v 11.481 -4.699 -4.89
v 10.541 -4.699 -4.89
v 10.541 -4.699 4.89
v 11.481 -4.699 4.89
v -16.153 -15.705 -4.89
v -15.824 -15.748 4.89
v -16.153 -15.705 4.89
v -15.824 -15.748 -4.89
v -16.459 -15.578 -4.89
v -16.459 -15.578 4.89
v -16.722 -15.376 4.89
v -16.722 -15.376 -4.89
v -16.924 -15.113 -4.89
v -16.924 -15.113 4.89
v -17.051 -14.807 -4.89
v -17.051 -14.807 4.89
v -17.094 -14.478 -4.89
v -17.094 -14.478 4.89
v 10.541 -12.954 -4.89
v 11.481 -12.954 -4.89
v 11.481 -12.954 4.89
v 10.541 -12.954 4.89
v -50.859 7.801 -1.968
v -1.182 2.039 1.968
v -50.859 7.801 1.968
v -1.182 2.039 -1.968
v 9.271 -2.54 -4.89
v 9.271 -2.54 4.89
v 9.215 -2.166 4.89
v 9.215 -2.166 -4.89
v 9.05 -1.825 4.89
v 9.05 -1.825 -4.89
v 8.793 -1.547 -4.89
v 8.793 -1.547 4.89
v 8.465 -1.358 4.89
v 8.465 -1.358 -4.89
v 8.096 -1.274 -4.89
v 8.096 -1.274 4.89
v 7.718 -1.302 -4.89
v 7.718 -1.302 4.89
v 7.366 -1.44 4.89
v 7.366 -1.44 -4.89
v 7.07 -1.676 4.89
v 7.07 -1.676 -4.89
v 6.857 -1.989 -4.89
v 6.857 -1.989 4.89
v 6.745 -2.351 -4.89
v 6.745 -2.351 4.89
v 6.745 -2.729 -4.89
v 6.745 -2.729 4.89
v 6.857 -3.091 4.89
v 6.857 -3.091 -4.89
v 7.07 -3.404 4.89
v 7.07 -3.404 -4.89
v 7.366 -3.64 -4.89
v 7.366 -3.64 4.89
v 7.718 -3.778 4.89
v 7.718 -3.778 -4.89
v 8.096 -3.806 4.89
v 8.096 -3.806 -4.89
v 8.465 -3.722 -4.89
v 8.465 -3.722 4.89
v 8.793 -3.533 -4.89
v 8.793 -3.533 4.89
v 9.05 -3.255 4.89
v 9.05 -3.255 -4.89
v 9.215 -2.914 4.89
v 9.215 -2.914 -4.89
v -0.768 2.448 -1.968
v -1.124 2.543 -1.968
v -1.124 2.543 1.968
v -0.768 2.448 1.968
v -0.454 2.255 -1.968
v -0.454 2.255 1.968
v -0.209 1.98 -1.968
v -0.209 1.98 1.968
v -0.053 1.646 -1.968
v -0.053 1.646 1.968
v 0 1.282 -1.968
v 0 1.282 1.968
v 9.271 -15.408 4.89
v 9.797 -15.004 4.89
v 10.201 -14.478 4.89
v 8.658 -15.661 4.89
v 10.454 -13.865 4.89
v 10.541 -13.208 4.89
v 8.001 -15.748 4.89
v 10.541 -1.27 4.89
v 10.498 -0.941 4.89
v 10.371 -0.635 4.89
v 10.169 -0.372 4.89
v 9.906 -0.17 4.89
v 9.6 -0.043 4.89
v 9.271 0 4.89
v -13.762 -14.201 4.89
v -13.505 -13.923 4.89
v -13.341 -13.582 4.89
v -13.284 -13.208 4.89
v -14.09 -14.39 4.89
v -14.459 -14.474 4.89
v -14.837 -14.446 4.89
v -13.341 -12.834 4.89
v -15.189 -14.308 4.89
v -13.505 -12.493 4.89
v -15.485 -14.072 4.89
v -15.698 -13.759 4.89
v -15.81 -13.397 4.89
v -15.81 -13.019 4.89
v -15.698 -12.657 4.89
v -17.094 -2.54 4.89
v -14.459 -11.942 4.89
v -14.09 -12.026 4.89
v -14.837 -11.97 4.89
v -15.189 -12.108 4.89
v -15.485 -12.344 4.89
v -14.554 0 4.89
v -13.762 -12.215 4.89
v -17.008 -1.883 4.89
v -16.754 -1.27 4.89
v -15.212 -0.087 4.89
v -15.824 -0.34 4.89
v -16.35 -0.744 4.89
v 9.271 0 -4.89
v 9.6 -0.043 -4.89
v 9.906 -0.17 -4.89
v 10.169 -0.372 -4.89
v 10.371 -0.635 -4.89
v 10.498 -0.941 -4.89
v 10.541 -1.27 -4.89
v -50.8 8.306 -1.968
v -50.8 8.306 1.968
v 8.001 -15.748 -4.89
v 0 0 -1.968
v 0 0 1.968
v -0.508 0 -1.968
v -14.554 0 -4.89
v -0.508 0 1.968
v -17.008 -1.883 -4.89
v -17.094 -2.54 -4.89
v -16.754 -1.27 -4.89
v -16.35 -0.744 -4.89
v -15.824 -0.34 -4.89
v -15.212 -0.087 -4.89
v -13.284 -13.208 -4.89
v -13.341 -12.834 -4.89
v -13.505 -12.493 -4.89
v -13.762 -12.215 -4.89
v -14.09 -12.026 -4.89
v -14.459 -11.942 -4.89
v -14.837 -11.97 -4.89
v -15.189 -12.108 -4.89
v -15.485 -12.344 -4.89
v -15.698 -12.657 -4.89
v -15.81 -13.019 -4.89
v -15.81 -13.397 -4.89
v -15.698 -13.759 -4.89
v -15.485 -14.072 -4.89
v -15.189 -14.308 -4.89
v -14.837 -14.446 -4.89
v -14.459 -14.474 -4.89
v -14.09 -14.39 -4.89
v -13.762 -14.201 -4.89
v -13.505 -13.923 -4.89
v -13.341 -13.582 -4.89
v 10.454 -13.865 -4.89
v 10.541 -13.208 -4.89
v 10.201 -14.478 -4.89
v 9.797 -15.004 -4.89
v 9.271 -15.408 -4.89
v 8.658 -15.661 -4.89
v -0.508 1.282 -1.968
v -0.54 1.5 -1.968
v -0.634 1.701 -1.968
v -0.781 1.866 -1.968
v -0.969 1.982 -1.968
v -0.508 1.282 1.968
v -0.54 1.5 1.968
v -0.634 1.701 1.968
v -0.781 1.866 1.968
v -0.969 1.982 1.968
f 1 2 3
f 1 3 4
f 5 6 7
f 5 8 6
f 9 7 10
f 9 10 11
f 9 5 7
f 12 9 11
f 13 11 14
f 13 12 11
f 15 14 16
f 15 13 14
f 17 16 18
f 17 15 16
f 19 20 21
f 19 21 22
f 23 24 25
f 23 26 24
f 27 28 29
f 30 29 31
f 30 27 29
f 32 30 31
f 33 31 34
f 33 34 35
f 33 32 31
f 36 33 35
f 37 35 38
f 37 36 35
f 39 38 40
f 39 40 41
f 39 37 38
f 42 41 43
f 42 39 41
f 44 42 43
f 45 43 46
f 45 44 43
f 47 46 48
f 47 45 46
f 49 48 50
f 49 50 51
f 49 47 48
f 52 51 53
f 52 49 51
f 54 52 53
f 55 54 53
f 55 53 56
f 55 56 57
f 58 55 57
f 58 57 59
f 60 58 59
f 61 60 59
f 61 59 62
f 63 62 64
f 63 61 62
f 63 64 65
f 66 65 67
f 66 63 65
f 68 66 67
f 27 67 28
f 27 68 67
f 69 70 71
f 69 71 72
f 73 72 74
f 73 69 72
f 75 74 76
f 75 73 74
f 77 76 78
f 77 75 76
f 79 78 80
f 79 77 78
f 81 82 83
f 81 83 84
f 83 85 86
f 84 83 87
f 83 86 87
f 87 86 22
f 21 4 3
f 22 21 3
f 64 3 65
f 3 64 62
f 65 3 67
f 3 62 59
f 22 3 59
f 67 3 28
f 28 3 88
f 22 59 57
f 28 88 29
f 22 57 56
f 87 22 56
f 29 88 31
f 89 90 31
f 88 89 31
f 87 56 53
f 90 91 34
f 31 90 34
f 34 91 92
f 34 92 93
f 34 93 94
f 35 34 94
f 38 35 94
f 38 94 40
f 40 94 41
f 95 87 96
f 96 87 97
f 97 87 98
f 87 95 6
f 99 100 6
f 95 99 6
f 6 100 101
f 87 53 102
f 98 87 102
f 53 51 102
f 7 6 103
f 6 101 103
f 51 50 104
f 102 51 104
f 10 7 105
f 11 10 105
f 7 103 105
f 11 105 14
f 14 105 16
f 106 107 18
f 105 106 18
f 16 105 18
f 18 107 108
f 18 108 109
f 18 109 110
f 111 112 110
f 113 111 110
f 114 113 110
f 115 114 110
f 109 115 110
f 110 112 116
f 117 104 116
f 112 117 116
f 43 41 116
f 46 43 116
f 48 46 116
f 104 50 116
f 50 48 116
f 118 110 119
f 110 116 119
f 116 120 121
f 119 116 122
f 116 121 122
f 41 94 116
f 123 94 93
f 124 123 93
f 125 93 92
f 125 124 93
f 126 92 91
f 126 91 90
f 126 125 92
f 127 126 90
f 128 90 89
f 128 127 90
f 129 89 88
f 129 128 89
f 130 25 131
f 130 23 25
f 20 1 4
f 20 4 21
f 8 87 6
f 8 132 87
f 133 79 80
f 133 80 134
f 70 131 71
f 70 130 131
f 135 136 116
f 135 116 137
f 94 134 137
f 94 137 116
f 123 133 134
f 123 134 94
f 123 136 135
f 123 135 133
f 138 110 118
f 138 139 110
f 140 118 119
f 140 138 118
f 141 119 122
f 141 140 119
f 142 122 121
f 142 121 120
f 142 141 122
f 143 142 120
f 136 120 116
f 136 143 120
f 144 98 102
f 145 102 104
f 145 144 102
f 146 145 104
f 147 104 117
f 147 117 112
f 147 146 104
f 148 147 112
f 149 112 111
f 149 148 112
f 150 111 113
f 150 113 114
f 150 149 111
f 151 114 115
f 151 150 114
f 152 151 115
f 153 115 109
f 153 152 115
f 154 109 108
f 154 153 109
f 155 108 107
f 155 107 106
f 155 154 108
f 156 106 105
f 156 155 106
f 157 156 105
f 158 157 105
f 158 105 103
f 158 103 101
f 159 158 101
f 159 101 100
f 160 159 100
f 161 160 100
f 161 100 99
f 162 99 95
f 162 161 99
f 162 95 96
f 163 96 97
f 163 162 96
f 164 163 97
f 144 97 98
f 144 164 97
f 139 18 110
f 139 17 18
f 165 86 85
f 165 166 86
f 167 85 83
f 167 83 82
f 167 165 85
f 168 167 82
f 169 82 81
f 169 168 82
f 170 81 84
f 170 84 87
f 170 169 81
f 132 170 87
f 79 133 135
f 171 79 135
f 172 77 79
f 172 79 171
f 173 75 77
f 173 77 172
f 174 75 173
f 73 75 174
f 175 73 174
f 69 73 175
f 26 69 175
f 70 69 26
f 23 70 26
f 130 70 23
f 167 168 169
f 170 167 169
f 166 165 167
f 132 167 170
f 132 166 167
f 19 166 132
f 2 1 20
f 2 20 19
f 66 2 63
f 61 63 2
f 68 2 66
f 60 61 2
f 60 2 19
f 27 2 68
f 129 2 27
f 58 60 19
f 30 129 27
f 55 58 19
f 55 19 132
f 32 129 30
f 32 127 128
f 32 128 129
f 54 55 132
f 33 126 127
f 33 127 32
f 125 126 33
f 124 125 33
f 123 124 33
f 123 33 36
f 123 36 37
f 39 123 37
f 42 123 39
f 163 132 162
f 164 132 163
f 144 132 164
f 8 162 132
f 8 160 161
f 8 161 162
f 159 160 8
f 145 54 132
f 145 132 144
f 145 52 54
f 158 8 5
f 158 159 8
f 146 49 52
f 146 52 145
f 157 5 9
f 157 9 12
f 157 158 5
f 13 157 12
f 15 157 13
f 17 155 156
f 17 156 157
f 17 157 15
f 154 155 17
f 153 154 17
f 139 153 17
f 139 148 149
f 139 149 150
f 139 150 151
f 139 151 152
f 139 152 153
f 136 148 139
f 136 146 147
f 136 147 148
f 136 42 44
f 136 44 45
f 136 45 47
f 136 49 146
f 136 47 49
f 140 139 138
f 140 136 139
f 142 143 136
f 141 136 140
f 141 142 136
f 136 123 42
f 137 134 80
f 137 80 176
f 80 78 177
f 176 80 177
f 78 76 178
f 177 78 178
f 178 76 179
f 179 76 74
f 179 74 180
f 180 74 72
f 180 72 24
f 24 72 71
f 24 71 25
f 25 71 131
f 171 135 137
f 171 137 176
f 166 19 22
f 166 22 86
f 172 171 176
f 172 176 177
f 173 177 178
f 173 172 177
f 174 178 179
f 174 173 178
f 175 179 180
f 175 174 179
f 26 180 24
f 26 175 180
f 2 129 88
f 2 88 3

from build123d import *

# Parameters (mm, degrees)
EXTRUDE_THIN1_DEPTH = 1.9685
SKETCH2_R           = 1.27
BOSS_EXTRUDE1_DEPTH = 4.8895


with BuildPart() as part:
    # Sketch1 → Extrude-Thin1 (new body)
    with BuildSketch(Plane.XY):
        with BuildLine():
            Line((-50.8, 8.3058), (-1.123661277, 2.543344708))
            ThreePointArc((-1.123661277, 2.543344708), (-0.321646116, 2.12650803), (0, 1.281803992))
            Line((0, 1.281803992), (0, 0))
            Line((0, 0), (-0.508, 0))
            Line((-0.508, 0), (-0.508, 1.281803992))
            ThreePointArc((-0.508, 1.281803992), (-0.70098767, 1.788626415), (-1.182196766, 2.038728422))
            Line((-1.182196766, 2.038728422), (-50.858535489, 7.801183714))
            Line((-50.858535489, 7.801183714), (-50.8, 8.3058))
        make_face()
    extrude_thin1 = extrude(amount=-EXTRUDE_THIN1_DEPTH)

    # Sketch2 → Boss-Extrude1 (add)
    with BuildSketch(Plane.XY):
        with BuildLine():
            Line((-14.5542, 0), (9.271, 0))
            ThreePointArc((9.271, 0), (10.169025612, -0.371974388), (10.541, -1.27))
            Line((10.541, -1.27), (10.541, -4.699))
            Line((10.541, -4.699), (11.4808, -4.699))
            Line((11.4808, -4.699), (11.4808, -12.954))
            Line((11.4808, -12.954), (10.541, -12.954))
            Line((10.541, -12.954), (10.541, -13.208))
            ThreePointArc((10.541, -13.208), (9.797051224, -15.004051224), (8.001, -15.748))
            Line((8.001, -15.748), (-15.8242, -15.748))
            ThreePointArc((-15.8242, -15.748), (-16.722225612, -15.376025612), (-17.0942, -14.478))
            Line((-17.0942, -14.478), (-17.0942, -2.54))
            ThreePointArc((-17.0942, -2.54), (-16.350251224, -0.743948776), (-14.5542, 0))
        make_face()
        with Locations((8.001, -2.54)):
            Circle(SKETCH2_R, mode=Mode.SUBTRACT)
        with Locations((-14.5542, -13.208)):
            Circle(SKETCH2_R, mode=Mode.SUBTRACT)
    boss_extrude1 = extrude(amount=-BOSS_EXTRUDE1_DEPTH)

    # Mirror1: Extrude-Thin1, Boss-Extrude1 across Front Plane
    add(extrude_thin1.mirror(Plane.XY))
    add(boss_extrude1.mirror(Plane.XY))


solid = part.part
